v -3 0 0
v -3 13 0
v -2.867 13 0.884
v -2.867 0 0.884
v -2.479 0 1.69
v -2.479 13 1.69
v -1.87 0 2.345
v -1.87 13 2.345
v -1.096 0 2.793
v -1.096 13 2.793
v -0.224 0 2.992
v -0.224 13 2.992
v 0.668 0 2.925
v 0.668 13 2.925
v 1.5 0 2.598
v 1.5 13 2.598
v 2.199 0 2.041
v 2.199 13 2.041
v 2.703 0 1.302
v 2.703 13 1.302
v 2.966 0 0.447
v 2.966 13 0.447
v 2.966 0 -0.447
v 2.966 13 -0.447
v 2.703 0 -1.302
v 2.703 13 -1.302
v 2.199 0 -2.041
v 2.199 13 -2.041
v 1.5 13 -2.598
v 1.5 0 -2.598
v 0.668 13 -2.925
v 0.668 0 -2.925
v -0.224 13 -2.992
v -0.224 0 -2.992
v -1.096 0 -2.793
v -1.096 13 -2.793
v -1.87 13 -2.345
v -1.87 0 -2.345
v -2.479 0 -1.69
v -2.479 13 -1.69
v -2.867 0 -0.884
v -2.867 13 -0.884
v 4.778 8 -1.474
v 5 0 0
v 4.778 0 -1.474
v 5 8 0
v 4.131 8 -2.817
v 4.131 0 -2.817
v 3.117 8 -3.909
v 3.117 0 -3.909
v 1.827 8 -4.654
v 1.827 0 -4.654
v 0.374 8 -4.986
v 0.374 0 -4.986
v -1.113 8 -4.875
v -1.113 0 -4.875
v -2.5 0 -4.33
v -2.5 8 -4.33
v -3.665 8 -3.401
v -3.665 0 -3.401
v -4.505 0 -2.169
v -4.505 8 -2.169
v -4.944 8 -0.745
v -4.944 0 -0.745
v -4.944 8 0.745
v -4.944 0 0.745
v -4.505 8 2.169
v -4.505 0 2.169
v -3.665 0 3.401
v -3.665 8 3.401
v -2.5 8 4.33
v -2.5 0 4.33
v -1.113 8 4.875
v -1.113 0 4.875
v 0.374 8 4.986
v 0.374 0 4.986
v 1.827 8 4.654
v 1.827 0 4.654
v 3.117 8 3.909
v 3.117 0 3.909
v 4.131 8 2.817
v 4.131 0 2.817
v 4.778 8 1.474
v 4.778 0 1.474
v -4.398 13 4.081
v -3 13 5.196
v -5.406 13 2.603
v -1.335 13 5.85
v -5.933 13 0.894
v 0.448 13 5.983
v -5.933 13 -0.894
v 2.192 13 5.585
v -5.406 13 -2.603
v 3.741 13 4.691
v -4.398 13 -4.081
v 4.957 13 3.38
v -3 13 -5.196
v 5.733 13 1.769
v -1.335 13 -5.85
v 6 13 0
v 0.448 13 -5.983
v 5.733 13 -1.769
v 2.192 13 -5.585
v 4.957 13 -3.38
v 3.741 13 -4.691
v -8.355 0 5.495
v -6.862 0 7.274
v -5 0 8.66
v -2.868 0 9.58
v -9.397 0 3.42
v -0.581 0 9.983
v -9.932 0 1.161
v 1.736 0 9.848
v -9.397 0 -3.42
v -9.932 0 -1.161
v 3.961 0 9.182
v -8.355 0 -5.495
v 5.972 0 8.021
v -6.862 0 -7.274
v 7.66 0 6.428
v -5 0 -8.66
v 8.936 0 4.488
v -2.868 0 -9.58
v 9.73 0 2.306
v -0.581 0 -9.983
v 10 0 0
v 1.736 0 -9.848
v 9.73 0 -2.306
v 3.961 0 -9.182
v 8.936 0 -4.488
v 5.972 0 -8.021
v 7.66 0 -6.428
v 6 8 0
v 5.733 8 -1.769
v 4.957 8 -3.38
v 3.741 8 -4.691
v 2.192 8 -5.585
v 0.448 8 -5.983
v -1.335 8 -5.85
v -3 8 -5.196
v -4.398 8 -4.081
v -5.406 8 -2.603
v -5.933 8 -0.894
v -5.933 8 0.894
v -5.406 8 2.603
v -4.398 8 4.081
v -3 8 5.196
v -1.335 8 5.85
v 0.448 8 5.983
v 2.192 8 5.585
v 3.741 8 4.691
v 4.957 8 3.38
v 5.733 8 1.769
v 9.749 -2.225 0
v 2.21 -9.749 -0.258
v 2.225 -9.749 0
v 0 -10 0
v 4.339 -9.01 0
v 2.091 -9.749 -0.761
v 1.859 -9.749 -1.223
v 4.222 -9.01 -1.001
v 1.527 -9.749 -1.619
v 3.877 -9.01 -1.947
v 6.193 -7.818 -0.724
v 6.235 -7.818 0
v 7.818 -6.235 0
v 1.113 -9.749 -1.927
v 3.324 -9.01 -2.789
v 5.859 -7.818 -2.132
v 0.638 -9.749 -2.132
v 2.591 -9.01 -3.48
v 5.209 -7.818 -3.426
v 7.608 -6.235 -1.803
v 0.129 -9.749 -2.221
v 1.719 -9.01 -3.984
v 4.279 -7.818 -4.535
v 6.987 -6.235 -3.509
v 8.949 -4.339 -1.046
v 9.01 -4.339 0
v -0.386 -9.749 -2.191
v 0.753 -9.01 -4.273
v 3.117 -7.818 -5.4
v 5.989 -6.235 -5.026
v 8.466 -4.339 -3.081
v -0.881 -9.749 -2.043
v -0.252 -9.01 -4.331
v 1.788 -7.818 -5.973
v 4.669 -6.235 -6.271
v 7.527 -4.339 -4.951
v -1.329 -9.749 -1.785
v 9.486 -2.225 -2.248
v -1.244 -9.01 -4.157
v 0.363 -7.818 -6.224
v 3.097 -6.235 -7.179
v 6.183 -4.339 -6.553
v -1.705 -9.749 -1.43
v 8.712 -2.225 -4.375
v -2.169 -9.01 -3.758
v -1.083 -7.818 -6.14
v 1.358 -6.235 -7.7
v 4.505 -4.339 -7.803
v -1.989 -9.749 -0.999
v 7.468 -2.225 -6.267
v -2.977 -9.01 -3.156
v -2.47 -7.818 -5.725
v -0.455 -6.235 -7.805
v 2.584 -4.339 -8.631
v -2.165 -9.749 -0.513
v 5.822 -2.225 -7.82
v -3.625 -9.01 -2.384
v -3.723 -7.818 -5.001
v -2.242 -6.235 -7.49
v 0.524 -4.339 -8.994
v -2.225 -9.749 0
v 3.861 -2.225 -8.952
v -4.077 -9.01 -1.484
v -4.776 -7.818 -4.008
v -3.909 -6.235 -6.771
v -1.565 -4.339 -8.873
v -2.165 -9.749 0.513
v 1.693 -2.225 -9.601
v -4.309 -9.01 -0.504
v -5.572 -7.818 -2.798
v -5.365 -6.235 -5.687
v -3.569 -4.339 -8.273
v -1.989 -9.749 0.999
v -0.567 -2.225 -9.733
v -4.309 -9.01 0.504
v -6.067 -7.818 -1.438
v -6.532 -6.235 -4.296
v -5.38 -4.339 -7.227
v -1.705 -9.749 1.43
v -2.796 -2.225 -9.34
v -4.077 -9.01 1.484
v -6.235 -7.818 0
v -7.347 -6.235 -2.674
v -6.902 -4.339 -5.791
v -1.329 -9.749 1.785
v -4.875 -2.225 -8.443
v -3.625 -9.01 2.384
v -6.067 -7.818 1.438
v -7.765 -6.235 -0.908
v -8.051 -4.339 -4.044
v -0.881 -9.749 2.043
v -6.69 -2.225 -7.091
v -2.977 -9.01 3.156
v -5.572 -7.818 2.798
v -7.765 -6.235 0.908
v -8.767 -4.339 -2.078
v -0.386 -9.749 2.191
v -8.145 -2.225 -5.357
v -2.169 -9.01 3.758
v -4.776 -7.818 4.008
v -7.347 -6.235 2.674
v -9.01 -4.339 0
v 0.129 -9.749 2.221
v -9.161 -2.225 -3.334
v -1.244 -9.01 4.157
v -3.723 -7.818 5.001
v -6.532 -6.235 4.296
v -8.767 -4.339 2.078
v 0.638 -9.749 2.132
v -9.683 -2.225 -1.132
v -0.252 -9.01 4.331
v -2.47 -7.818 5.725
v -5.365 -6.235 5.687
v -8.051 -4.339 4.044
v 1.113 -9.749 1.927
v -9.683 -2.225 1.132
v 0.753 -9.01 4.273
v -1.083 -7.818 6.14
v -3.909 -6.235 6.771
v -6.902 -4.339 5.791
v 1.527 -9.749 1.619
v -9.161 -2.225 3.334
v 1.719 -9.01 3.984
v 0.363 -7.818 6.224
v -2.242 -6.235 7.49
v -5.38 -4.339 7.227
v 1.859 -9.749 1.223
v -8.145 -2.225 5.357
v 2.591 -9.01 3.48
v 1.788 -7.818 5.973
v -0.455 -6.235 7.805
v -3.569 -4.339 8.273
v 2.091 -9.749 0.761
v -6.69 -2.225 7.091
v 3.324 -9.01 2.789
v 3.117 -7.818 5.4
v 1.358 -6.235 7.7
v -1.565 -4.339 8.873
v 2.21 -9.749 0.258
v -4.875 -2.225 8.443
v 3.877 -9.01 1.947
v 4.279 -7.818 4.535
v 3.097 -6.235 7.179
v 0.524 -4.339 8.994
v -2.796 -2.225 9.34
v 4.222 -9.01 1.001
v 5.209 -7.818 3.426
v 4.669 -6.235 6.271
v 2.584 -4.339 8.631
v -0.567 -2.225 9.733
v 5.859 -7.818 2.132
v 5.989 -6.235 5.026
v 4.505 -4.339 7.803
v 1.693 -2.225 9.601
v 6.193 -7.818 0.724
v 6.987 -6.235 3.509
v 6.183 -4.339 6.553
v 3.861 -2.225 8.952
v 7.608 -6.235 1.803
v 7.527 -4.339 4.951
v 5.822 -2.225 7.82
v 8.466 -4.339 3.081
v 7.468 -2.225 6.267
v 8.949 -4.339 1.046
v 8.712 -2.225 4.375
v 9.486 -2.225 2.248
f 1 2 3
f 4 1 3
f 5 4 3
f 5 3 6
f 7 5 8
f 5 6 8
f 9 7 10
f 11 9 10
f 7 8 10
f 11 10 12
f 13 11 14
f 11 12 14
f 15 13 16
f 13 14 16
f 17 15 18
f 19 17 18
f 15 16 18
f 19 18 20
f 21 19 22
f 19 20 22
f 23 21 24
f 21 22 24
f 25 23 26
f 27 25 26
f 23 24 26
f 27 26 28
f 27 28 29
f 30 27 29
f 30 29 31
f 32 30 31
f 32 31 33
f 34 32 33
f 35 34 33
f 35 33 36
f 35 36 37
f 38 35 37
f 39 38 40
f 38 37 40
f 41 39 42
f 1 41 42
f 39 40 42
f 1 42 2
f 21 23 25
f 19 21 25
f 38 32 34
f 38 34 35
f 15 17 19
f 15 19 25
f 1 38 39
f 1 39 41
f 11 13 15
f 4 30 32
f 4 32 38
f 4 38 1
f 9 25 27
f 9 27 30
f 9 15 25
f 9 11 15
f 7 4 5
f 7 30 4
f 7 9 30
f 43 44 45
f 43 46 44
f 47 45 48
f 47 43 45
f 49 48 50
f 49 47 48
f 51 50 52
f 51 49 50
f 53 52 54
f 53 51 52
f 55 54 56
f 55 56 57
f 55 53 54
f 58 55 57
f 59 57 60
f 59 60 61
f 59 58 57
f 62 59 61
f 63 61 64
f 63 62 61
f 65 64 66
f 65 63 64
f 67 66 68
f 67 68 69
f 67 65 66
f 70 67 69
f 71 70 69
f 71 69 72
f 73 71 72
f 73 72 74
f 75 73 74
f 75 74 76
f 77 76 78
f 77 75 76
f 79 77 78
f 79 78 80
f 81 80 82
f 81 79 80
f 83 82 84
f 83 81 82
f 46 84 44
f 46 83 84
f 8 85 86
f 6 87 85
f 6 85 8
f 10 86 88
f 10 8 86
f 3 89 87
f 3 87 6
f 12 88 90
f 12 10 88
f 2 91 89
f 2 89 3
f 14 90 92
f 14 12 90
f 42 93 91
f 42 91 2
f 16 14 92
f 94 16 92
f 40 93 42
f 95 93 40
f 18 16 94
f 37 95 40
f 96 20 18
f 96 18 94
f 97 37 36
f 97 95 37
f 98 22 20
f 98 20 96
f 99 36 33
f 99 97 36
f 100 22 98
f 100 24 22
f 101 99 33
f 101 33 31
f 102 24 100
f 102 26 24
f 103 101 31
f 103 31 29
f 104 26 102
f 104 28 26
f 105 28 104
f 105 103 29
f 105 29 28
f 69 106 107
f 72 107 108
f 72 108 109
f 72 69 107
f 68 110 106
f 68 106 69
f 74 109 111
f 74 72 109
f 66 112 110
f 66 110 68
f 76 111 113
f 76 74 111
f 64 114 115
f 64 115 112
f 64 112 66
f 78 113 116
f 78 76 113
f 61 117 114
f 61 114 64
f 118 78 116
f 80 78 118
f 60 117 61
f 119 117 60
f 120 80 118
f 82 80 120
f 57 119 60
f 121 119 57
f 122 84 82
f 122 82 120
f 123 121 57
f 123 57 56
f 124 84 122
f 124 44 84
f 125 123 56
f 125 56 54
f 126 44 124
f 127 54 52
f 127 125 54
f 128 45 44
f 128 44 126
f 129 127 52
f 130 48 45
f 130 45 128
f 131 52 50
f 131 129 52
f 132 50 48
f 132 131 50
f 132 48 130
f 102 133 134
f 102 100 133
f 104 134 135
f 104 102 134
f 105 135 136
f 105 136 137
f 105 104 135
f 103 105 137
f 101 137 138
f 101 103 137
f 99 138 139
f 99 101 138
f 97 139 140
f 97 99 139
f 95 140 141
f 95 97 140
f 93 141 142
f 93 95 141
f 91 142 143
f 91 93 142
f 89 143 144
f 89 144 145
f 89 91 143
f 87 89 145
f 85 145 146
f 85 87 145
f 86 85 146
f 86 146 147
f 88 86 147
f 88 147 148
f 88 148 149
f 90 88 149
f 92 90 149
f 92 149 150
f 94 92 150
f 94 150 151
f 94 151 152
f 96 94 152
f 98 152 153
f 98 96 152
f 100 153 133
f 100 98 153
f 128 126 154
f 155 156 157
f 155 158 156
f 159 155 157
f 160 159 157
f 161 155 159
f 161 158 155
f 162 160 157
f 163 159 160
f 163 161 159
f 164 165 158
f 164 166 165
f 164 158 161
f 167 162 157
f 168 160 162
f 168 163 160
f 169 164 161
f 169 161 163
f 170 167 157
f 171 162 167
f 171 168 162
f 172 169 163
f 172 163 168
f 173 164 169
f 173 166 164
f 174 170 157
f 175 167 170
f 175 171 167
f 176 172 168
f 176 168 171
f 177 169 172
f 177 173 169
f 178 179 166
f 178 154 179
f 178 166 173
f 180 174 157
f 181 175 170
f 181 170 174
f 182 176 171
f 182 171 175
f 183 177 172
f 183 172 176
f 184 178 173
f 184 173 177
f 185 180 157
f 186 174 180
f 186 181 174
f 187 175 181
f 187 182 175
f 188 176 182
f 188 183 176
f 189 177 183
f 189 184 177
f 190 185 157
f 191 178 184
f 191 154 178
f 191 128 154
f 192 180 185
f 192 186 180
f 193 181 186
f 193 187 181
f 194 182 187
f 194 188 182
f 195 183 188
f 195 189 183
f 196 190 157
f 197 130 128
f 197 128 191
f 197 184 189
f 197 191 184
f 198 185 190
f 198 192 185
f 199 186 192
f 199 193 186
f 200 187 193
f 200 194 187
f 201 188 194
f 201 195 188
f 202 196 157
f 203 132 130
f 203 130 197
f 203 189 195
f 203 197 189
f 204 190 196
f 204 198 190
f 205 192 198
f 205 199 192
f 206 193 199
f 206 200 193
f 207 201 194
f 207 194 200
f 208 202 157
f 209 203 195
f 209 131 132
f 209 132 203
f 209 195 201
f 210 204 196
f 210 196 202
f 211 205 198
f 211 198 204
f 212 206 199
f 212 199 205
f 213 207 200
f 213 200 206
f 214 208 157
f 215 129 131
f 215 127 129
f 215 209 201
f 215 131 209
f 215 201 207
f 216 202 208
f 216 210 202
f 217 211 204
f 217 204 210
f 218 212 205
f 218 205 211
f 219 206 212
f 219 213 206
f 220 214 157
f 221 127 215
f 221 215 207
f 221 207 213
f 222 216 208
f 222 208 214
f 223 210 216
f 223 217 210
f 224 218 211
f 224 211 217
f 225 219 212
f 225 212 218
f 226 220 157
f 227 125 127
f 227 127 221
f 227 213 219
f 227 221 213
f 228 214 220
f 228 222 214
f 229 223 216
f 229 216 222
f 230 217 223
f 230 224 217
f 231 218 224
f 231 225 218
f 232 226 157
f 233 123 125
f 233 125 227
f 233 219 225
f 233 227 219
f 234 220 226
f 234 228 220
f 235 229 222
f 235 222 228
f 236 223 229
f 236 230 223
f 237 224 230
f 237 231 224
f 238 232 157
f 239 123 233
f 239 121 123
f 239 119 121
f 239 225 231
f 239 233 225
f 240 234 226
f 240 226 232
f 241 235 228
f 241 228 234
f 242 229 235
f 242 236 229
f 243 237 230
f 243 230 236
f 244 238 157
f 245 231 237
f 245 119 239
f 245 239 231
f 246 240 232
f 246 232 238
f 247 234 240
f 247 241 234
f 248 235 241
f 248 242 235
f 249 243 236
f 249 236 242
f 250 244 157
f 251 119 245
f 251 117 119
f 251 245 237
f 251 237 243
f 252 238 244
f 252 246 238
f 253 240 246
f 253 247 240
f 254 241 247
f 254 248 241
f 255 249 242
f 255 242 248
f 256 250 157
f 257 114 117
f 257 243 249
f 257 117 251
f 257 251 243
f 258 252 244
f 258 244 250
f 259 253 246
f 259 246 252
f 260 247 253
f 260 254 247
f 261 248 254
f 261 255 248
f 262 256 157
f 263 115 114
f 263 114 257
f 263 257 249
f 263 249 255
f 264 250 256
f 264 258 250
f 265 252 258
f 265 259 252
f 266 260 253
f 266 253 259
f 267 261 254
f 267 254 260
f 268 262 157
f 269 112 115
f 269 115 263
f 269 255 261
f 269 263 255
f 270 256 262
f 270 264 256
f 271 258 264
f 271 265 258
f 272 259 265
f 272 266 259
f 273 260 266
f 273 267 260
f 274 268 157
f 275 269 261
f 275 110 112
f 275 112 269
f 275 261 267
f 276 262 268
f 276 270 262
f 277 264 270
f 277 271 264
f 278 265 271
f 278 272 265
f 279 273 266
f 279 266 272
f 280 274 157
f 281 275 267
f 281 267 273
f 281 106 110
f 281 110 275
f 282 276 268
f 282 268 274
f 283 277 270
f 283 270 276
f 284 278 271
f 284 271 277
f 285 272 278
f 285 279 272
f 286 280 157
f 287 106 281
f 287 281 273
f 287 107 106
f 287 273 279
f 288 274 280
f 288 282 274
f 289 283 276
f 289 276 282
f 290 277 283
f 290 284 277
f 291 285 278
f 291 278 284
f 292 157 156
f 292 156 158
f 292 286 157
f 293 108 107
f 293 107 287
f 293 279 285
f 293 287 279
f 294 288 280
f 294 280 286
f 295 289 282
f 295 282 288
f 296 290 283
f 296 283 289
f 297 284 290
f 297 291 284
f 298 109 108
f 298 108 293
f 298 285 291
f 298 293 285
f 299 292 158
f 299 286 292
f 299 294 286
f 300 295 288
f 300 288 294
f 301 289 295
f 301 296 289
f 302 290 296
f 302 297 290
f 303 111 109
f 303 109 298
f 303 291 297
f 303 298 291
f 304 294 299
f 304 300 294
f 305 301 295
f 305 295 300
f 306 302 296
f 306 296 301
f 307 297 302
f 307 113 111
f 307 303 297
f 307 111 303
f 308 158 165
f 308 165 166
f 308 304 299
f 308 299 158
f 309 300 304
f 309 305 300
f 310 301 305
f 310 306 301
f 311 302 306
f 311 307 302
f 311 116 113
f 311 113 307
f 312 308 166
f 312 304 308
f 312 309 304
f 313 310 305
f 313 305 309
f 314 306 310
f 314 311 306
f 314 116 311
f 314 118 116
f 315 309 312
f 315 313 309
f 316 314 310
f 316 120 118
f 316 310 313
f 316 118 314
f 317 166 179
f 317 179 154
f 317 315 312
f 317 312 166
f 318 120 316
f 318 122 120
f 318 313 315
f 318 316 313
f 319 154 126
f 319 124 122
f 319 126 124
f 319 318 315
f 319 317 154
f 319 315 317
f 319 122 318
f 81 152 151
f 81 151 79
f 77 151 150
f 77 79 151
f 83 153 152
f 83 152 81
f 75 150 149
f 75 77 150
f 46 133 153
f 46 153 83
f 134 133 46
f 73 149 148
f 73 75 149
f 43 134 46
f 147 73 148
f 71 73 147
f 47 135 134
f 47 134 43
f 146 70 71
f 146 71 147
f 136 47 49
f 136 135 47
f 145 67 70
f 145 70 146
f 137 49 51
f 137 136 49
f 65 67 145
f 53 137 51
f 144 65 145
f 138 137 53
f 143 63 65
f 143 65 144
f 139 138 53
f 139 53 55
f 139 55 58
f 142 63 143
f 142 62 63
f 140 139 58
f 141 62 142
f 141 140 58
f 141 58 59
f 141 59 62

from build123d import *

# Parameters (mm, degrees)
SZKIC2_R                   = 3
WYTNIJ_WYCI_GNI_CIE1_DEPTH = 13


with BuildPart() as part:
    # Szkic1 → Obrót5 (revolve)
    with BuildSketch(Plane.XY, mode=Mode.PRIVATE) as obr_t5_sk:
        with BuildLine():
            Line((-10, 0), (-5, 0))
            Line((-5, 0), (-5, 8))
            Line((-5, 8), (-6, 8))
            Line((-6, 8), (-6, 13))
            Line((-6, 13), (0, 13))
            Line((0, 13), (0, 0))
            Line((0, 0), (0, -10))
            ThreePointArc((0, -10), (-7.071067812, -7.071067812), (-10, 0))
        make_face()
    revolve(obr_t5_sk.sketch.rotate(Axis((0, -10, 0), (0, 1, 0)), 180), axis=Axis((0, -10, 0), (0, 1, 0)))

    # Szkic2 → Wytnij-wyciągnięcie1 (cut)
    with BuildSketch(Plane(origin=(0, 13, 0), x_dir=(1, 0, 0), z_dir=(0, 1, 0))):
        with Locations(Location((0, 0, 0), (0, 0, 180))):
            Circle(SZKIC2_R)
    extrude(amount=-WYTNIJ_WYCI_GNI_CIE1_DEPTH, mode=Mode.SUBTRACT)


solid = part.part
